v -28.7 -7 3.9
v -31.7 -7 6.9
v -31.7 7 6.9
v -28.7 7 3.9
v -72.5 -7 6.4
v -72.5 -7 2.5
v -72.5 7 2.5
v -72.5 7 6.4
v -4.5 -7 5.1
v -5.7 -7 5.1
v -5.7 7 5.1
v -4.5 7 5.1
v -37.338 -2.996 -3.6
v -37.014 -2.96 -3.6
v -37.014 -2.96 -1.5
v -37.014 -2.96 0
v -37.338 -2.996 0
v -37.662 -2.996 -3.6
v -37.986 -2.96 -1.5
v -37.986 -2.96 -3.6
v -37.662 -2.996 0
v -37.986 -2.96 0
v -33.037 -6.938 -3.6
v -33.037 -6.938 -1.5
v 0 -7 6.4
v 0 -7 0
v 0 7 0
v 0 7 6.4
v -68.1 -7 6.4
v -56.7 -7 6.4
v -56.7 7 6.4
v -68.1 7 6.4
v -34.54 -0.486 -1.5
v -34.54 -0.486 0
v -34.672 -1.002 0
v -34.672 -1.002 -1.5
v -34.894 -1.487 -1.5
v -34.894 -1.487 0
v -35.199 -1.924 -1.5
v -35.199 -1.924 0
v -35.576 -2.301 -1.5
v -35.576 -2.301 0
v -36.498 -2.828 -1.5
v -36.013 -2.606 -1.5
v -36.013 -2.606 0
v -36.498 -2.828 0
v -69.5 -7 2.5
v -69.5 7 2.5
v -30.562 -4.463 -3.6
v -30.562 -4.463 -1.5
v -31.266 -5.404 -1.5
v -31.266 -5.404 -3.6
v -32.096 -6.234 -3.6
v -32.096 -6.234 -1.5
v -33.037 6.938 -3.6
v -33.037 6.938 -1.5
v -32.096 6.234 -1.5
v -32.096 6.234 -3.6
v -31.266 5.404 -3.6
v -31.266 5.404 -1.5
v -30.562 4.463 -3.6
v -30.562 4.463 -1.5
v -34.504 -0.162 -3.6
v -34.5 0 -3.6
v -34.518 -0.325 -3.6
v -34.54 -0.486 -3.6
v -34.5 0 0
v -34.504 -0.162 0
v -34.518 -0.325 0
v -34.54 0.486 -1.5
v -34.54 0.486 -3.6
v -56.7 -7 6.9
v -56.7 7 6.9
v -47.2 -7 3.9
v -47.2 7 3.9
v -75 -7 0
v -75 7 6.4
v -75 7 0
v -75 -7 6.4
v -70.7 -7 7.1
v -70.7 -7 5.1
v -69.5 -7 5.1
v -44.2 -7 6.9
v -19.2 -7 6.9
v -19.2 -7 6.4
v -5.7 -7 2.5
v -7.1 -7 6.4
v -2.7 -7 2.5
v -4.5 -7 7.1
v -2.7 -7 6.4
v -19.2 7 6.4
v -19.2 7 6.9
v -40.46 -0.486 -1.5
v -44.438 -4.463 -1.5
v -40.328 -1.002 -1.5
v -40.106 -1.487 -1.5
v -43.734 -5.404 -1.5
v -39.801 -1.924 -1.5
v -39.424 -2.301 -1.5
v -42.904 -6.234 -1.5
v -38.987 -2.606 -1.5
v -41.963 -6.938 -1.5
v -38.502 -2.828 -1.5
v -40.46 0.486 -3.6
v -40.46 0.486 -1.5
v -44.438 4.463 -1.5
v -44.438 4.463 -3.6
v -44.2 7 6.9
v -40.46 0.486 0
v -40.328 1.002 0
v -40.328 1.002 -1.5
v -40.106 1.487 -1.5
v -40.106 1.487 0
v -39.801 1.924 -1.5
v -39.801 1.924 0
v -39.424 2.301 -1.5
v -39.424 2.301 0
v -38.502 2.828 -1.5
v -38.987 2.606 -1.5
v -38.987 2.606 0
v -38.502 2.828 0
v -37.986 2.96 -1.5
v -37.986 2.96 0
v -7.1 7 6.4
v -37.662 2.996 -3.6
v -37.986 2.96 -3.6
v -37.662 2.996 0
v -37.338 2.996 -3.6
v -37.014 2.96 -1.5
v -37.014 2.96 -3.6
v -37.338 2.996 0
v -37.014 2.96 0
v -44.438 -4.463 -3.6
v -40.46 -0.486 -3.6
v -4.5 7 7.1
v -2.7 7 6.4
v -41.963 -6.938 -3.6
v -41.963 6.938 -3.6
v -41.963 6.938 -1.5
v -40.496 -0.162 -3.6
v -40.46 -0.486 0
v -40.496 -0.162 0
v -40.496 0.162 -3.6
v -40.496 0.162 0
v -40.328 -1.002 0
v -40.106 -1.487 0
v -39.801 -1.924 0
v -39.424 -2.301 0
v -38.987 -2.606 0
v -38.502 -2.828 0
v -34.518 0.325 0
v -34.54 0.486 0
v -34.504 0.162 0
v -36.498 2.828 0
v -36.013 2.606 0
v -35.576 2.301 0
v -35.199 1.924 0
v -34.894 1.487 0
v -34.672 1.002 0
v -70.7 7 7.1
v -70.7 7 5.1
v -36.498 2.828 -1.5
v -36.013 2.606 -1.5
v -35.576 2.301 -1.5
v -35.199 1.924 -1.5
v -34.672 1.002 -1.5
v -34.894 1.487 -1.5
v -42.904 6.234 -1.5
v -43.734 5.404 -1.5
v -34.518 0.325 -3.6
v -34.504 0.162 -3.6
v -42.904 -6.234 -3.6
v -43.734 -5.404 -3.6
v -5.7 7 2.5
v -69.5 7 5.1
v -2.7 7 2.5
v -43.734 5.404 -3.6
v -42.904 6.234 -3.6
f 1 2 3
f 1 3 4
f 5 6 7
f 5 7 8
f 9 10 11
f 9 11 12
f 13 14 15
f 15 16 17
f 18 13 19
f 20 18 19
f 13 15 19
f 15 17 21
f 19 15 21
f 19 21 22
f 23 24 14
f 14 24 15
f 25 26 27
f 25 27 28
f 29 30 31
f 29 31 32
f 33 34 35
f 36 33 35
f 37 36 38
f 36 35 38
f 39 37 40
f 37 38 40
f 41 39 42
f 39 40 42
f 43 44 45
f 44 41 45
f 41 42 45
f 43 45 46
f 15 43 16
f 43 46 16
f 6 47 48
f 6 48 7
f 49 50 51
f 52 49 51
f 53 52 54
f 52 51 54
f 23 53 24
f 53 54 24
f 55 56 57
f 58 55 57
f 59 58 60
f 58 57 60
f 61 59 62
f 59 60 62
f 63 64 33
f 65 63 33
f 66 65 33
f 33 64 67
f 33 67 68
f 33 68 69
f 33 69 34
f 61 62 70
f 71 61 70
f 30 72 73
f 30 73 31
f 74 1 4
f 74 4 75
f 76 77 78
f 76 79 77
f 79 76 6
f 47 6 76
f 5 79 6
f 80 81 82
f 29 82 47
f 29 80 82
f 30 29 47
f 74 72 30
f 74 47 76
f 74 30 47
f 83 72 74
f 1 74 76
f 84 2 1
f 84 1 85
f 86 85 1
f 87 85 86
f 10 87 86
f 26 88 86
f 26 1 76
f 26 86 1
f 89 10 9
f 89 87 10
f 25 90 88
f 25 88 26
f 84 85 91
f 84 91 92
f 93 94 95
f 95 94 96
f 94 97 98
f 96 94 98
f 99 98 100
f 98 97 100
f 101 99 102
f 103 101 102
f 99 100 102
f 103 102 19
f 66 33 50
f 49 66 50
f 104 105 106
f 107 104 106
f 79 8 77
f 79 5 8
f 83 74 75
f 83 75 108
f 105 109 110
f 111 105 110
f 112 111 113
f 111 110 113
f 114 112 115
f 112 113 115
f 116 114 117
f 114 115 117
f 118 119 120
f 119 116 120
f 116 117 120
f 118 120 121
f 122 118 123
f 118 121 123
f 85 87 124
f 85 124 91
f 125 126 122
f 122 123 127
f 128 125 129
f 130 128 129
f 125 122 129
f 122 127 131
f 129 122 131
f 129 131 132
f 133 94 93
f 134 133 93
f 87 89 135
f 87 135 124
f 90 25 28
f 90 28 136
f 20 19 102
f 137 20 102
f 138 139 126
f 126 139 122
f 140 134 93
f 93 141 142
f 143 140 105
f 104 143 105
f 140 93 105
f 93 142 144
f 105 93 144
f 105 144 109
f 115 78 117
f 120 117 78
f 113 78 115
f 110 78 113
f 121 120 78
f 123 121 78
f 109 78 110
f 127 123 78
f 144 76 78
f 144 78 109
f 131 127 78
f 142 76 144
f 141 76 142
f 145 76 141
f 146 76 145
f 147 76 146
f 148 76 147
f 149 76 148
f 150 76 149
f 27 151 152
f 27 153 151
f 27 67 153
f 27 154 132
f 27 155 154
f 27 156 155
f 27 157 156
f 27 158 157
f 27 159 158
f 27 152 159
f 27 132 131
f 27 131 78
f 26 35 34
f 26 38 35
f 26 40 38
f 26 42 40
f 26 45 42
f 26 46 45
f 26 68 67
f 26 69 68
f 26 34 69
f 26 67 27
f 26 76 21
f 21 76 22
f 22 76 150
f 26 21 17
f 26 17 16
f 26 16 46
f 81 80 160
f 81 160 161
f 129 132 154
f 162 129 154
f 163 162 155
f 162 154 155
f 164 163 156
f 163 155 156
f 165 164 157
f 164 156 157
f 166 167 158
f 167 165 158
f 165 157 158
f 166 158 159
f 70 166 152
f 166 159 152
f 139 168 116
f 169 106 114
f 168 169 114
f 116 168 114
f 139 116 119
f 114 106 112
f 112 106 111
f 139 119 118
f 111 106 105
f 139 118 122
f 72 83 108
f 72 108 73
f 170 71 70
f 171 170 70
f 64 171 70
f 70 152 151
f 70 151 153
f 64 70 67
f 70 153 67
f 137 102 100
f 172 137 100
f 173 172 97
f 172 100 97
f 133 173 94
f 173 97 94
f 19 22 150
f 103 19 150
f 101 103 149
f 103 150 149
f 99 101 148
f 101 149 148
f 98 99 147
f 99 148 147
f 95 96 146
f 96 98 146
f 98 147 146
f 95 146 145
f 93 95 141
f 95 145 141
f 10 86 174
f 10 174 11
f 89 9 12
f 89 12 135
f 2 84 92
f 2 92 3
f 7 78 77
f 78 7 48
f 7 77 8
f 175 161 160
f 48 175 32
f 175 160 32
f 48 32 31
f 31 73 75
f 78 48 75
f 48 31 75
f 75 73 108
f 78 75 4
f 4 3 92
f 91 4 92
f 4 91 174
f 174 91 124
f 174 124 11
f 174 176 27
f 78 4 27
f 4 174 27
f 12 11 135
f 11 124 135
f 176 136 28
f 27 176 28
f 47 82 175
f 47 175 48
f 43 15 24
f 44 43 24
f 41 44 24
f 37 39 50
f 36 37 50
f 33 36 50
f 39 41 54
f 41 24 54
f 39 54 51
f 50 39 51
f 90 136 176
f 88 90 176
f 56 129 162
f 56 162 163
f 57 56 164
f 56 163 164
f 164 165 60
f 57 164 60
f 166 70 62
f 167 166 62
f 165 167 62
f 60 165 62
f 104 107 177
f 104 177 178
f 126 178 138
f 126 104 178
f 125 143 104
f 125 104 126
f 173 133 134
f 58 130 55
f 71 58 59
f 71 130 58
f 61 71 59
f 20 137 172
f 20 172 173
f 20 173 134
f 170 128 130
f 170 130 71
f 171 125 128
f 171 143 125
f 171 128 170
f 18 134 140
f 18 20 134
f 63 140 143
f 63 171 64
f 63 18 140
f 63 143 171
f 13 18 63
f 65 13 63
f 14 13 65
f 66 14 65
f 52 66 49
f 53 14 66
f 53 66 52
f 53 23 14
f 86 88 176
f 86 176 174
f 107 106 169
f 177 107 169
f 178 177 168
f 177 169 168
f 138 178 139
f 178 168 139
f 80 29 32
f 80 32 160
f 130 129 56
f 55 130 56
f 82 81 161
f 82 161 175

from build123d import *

# Parameters (mm, degrees)
F1_DEPTH = 7
F3_DEPTH = 3.6
F4_START = 1.5
F4_DEPTH = 2.1


with BuildPart() as f1:
    # F0 (on Front) → F1 (new body, symmetric)
    with BuildSketch(Plane.XZ):
        Polygon((-75, 0), (0, 0), (0, 6.4), (-2.7, 6.4), (-2.7, 2.5), (-5.7, 2.5), (-5.7, 5.1), (-4.5, 5.1), (-4.5, 6.4), (-4.5, 7.1), (-7.1, 6.4), (-19.2, 6.4), (-19.2, 6.9), (-31.7, 6.9), (-31.2, 6.4), (-28.7, 3.9), (-47.2, 3.9), (-44.7, 6.4), (-44.2, 6.9), (-56.7, 6.9), (-56.7, 6.4), (-68.1, 6.4), (-70.7, 7.1), (-70.7, 6.4), (-70.7, 5.1), (-69.5, 5.1), (-69.5, 2.5), (-72.5, 2.5), (-72.5, 6.4), (-75, 6.4), align=None)
    extrude(amount=F1_DEPTH, both=True)

    # F2 (on face) → F3 (join)
    with BuildSketch(Plane(origin=(0, 0, 0), x_dir=(1, 0, 0), z_dir=(0, 0, -1))):
        with BuildLine():
            ThreePointArc((-34.5395570389, -0.4855692269), (-34.5099056133, -0.2435889127), (-34.5, 0))
            ThreePointArc((-34.5, 0), (-34.5099056133, 0.2435889127), (-34.5395570389, 0.4855692269))
            ThreePointArc((-34.5395570389, 0.4855692269), (-35.3786796564, 2.1213203436), (-37.0144307731, 2.9604429611))
            ThreePointArc((-37.0144307731, 2.9604429611), (-37.5, 3), (-37.9855692269, 2.9604429611))
            ThreePointArc((-37.9855692269, 2.9604429611), (-39.6213203436, 2.1213203436), (-40.4604429611, 0.4855692269))
            ThreePointArc((-40.4604429611, 0.4855692269), (-40.5, 0), (-40.4604429611, -0.4855692269))
            ThreePointArc((-40.4604429611, -0.4855692269), (-39.6213203436, -2.1213203436), (-37.9855692269, -2.9604429611))
            ThreePointArc((-37.9855692269, -2.9604429611), (-37.5, -3), (-37.0144307731, -2.9604429611))
            ThreePointArc((-37.0144307731, -2.9604429611), (-35.3786796564, -2.1213203436), (-34.5395570389, -0.4855692269))
        make_face()
    extrude(amount=F3_DEPTH)

    # F2 (on face) → F4 (join)
    with BuildSketch(Plane(origin=(0, 0, 0), x_dir=(1, 0, 0), z_dir=(0, 0, -1)).offset(F4_START)):
        with BuildLine():
            ThreePointArc((-40.4604429611, 0.4855692269), (-39.6213203436, 2.1213203436), (-37.9855692269, 2.9604429611))
            Line((-37.9855692269, 2.9604429611), (-41.9634402584, 6.9383139926))
            ThreePointArc((-41.9634402584, 6.9383139926), (-43.3336309448, 5.8336309448), (-44.4383139926, 4.4634402584))
            Line((-44.4383139926, 4.4634402584), (-40.4604429611, 0.4855692269))
        make_face()
        with BuildLine():
            ThreePointArc((-37.0144307731, 2.9604429611), (-35.3786796564, 2.1213203436), (-34.5395570389, 0.4855692269))
            Line((-34.5395570389, 0.4855692269), (-30.5616860074, 4.4634402584))
            ThreePointArc((-30.5616860074, 4.4634402584), (-31.6663690552, 5.8336309448), (-33.0365597416, 6.9383139926))
            Line((-33.0365597416, 6.9383139926), (-37.0144307731, 2.9604429611))
        make_face()
        with BuildLine():
            Line((-41.9634402584, -6.9383139926), (-37.9855692269, -2.9604429611))
            ThreePointArc((-37.9855692269, -2.9604429611), (-39.6213203436, -2.1213203436), (-40.4604429611, -0.4855692269))
            Line((-40.4604429611, -0.4855692269), (-44.4383139926, -4.4634402584))
            ThreePointArc((-44.4383139926, -4.4634402584), (-43.3336309448, -5.8336309448), (-41.9634402584, -6.9383139926))
        make_face()
        with BuildLine():
            Line((-30.5616860074, -4.4634402584), (-34.5395570389, -0.4855692269))
            ThreePointArc((-34.5395570389, -0.4855692269), (-35.3786796564, -2.1213203436), (-37.0144307731, -2.9604429611))
            Line((-37.0144307731, -2.9604429611), (-33.0365597416, -6.9383139926))
            ThreePointArc((-33.0365597416, -6.9383139926), (-31.6663690552, -5.8336309448), (-30.5616860074, -4.4634402584))
        make_face()
    extrude(amount=F4_DEPTH)


solid = f1.part
